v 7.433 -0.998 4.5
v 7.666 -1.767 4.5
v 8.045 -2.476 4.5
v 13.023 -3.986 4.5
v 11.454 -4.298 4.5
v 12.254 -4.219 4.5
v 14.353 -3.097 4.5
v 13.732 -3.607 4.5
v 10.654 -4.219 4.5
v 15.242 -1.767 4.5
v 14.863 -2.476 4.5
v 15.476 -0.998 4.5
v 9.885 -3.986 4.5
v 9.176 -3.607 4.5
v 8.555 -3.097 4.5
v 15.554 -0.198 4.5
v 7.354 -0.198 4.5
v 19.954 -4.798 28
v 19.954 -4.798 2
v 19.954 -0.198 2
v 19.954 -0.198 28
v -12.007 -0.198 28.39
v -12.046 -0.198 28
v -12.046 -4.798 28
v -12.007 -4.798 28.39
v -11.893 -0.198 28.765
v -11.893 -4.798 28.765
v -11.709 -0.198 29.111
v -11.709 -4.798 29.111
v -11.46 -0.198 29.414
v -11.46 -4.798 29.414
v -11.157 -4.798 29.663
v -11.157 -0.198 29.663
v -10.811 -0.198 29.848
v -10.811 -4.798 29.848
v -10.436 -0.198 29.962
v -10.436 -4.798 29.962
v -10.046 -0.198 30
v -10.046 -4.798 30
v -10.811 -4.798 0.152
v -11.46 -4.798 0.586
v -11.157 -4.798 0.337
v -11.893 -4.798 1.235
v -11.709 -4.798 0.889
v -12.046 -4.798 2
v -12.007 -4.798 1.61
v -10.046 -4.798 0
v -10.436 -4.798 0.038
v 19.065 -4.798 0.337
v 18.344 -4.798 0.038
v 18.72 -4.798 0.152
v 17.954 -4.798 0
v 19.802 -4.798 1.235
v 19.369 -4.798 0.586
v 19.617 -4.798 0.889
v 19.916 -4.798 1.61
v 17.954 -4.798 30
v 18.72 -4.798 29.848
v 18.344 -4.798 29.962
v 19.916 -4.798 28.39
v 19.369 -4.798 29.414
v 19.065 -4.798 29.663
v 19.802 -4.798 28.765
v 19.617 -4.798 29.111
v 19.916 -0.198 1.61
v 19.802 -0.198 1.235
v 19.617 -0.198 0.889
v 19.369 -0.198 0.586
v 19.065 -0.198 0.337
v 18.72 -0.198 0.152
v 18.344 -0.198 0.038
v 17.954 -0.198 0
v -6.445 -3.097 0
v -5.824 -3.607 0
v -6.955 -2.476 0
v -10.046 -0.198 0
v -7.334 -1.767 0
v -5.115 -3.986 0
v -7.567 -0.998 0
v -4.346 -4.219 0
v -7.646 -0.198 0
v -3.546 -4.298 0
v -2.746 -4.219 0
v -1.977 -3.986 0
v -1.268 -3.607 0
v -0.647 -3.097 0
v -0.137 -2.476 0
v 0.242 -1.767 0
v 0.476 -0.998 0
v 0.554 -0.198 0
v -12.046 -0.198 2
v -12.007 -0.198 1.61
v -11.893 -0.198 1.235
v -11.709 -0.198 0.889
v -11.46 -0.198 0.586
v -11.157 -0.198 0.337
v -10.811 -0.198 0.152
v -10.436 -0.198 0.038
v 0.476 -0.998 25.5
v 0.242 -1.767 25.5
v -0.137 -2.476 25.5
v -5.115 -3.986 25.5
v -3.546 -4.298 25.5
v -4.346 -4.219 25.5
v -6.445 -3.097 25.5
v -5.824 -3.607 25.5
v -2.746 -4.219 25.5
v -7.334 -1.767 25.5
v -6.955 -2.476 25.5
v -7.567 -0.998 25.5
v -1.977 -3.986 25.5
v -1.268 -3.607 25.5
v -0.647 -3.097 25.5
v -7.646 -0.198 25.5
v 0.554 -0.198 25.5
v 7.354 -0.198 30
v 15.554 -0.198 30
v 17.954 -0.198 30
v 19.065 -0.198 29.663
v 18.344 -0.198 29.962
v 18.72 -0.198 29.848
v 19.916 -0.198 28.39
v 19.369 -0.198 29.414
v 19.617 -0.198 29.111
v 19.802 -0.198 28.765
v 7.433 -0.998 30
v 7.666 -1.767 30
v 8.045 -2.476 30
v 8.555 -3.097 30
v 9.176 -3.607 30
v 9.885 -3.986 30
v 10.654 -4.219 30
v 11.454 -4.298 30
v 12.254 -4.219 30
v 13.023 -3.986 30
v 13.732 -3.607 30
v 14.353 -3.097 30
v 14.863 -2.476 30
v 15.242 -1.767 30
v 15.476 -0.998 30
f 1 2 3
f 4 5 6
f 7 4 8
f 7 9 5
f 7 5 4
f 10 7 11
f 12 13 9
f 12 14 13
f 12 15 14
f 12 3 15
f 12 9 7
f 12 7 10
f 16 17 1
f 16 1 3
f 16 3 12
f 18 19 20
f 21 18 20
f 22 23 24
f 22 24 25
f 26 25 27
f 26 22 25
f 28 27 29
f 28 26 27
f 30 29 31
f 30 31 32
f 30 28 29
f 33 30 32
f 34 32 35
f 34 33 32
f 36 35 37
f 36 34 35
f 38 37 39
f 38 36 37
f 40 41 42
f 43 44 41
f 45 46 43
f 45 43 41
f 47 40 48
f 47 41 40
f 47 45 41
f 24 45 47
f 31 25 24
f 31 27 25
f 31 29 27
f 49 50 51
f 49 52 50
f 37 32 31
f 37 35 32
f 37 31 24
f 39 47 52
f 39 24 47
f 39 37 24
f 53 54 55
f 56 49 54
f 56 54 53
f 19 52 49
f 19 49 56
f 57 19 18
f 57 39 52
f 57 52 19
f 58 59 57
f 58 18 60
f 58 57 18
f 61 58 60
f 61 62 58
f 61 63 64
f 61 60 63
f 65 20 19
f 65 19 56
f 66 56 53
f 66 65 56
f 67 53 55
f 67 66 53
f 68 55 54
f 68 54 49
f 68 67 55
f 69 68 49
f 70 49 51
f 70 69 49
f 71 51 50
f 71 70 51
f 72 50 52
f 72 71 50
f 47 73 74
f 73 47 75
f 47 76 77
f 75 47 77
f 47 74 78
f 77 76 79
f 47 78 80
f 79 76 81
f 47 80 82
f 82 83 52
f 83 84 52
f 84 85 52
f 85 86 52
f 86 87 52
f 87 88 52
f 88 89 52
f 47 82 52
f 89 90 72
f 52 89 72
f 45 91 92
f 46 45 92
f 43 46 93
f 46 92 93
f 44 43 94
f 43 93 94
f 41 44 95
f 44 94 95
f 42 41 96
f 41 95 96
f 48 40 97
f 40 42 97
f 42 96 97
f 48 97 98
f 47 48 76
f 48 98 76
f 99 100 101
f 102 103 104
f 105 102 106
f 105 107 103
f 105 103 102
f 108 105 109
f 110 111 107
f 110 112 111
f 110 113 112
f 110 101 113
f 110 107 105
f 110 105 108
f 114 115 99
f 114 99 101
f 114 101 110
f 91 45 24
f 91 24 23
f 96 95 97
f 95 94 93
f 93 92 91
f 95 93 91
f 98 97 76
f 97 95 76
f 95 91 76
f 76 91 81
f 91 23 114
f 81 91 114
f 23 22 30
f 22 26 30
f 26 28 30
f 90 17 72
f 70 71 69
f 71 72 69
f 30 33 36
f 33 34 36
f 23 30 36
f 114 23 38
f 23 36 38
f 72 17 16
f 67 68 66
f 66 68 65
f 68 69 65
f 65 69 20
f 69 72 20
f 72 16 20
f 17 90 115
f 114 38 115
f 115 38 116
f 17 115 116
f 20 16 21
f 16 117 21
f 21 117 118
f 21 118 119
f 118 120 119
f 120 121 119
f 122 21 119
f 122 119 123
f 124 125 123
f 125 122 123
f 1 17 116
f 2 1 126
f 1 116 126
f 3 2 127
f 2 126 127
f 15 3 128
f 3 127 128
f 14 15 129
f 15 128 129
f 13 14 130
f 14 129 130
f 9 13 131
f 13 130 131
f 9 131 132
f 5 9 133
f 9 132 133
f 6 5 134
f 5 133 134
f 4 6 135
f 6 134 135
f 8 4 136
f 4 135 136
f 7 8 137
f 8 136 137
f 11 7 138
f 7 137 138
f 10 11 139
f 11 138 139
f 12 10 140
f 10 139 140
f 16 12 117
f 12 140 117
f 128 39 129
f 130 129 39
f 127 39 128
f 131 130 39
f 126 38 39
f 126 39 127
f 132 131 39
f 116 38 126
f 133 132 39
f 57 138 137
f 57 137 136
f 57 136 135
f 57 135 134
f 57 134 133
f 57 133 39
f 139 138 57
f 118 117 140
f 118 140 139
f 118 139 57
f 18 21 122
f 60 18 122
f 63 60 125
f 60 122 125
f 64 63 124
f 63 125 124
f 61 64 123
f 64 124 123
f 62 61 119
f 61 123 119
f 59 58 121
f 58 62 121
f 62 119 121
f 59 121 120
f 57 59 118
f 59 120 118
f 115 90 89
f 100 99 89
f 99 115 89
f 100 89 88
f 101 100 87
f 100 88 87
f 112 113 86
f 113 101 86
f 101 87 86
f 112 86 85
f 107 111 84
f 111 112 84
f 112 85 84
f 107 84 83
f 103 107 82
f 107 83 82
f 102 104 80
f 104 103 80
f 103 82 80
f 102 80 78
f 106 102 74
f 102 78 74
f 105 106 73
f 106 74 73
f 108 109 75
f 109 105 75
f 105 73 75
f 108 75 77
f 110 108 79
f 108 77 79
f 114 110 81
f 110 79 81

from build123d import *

# Parameters (mm, degrees)
SKETCH1_W           = 32
SKETCH1_H           = 6.5
BOSS_EXTRUDE1_DEPTH = 30
FILLET1_R           = 2
SKETCH2_R           = 4.1
CUT_EXTRUDE1_DEPTH  = 25.5
SKETCH3_R           = 4.1
CUT_EXTRUDE2_DEPTH  = 25.5
SKETCH5_W           = 32
SKETCH5_H           = 0.1
CUT_EXTRUDE3_DEPTH  = 37.629308734
SKETCH6_W           = 32
SKETCH6_H           = 1.8
CUT_EXTRUDE4_DEPTH  = 37.629308734


with BuildPart() as part:
    # Sketch1 → Boss-Extrude1 (new body)
    with BuildSketch(Plane.XY):
        with Locations((3.954315745, -3.347843701)):
            Rectangle(SKETCH1_W, SKETCH1_H)
    extrude(amount=BOSS_EXTRUDE1_DEPTH)

    # Fillet1
    fillet1_edges = [part.edges().sort_by_distance(p)[0] for p in [
        (19.954315745, -3.347843701, 30),
        (-12.045684255, -3.347843701, 30),
        (19.954315745, -3.347843701, 0),
        (-12.045684255, -3.347843701, 0),
    ]]
    fillet(fillet1_edges, radius=FILLET1_R)

    # Sketch2 → Cut-Extrude1 (cut)
    with BuildSketch(Plane(origin=(0, 0, 0), x_dir=(-1, 0, 0), z_dir=(0, 0, -1))):
        with Locations((3.545684255, -0.197843701)):
            Circle(SKETCH2_R)
    extrude(amount=-CUT_EXTRUDE1_DEPTH, mode=Mode.SUBTRACT)

    # Sketch3 → Cut-Extrude2 (cut)
    with BuildSketch(Plane.XY.offset(30)):
        with Locations((11.454315745, -0.197843701)):
            Circle(SKETCH3_R)
    extrude(amount=-CUT_EXTRUDE2_DEPTH, mode=Mode.SUBTRACT)

    # Sketch5 → Cut-Extrude3 (cut, through all)
    with BuildSketch(Plane.XY.offset(30)):
        with Locations((3.954315745, -0.147843701)):
            Rectangle(SKETCH5_W, SKETCH5_H)
    extrude(amount=-CUT_EXTRUDE3_DEPTH, mode=Mode.SUBTRACT)

    # Sketch6 → Cut-Extrude4 (cut, through all)
    with BuildSketch(Plane.XY.offset(30)):
        with Locations((3.954315745, -5.697843701)):
            Rectangle(SKETCH6_W, SKETCH6_H)
    extrude(amount=-CUT_EXTRUDE4_DEPTH, mode=Mode.SUBTRACT)


solid = part.part
